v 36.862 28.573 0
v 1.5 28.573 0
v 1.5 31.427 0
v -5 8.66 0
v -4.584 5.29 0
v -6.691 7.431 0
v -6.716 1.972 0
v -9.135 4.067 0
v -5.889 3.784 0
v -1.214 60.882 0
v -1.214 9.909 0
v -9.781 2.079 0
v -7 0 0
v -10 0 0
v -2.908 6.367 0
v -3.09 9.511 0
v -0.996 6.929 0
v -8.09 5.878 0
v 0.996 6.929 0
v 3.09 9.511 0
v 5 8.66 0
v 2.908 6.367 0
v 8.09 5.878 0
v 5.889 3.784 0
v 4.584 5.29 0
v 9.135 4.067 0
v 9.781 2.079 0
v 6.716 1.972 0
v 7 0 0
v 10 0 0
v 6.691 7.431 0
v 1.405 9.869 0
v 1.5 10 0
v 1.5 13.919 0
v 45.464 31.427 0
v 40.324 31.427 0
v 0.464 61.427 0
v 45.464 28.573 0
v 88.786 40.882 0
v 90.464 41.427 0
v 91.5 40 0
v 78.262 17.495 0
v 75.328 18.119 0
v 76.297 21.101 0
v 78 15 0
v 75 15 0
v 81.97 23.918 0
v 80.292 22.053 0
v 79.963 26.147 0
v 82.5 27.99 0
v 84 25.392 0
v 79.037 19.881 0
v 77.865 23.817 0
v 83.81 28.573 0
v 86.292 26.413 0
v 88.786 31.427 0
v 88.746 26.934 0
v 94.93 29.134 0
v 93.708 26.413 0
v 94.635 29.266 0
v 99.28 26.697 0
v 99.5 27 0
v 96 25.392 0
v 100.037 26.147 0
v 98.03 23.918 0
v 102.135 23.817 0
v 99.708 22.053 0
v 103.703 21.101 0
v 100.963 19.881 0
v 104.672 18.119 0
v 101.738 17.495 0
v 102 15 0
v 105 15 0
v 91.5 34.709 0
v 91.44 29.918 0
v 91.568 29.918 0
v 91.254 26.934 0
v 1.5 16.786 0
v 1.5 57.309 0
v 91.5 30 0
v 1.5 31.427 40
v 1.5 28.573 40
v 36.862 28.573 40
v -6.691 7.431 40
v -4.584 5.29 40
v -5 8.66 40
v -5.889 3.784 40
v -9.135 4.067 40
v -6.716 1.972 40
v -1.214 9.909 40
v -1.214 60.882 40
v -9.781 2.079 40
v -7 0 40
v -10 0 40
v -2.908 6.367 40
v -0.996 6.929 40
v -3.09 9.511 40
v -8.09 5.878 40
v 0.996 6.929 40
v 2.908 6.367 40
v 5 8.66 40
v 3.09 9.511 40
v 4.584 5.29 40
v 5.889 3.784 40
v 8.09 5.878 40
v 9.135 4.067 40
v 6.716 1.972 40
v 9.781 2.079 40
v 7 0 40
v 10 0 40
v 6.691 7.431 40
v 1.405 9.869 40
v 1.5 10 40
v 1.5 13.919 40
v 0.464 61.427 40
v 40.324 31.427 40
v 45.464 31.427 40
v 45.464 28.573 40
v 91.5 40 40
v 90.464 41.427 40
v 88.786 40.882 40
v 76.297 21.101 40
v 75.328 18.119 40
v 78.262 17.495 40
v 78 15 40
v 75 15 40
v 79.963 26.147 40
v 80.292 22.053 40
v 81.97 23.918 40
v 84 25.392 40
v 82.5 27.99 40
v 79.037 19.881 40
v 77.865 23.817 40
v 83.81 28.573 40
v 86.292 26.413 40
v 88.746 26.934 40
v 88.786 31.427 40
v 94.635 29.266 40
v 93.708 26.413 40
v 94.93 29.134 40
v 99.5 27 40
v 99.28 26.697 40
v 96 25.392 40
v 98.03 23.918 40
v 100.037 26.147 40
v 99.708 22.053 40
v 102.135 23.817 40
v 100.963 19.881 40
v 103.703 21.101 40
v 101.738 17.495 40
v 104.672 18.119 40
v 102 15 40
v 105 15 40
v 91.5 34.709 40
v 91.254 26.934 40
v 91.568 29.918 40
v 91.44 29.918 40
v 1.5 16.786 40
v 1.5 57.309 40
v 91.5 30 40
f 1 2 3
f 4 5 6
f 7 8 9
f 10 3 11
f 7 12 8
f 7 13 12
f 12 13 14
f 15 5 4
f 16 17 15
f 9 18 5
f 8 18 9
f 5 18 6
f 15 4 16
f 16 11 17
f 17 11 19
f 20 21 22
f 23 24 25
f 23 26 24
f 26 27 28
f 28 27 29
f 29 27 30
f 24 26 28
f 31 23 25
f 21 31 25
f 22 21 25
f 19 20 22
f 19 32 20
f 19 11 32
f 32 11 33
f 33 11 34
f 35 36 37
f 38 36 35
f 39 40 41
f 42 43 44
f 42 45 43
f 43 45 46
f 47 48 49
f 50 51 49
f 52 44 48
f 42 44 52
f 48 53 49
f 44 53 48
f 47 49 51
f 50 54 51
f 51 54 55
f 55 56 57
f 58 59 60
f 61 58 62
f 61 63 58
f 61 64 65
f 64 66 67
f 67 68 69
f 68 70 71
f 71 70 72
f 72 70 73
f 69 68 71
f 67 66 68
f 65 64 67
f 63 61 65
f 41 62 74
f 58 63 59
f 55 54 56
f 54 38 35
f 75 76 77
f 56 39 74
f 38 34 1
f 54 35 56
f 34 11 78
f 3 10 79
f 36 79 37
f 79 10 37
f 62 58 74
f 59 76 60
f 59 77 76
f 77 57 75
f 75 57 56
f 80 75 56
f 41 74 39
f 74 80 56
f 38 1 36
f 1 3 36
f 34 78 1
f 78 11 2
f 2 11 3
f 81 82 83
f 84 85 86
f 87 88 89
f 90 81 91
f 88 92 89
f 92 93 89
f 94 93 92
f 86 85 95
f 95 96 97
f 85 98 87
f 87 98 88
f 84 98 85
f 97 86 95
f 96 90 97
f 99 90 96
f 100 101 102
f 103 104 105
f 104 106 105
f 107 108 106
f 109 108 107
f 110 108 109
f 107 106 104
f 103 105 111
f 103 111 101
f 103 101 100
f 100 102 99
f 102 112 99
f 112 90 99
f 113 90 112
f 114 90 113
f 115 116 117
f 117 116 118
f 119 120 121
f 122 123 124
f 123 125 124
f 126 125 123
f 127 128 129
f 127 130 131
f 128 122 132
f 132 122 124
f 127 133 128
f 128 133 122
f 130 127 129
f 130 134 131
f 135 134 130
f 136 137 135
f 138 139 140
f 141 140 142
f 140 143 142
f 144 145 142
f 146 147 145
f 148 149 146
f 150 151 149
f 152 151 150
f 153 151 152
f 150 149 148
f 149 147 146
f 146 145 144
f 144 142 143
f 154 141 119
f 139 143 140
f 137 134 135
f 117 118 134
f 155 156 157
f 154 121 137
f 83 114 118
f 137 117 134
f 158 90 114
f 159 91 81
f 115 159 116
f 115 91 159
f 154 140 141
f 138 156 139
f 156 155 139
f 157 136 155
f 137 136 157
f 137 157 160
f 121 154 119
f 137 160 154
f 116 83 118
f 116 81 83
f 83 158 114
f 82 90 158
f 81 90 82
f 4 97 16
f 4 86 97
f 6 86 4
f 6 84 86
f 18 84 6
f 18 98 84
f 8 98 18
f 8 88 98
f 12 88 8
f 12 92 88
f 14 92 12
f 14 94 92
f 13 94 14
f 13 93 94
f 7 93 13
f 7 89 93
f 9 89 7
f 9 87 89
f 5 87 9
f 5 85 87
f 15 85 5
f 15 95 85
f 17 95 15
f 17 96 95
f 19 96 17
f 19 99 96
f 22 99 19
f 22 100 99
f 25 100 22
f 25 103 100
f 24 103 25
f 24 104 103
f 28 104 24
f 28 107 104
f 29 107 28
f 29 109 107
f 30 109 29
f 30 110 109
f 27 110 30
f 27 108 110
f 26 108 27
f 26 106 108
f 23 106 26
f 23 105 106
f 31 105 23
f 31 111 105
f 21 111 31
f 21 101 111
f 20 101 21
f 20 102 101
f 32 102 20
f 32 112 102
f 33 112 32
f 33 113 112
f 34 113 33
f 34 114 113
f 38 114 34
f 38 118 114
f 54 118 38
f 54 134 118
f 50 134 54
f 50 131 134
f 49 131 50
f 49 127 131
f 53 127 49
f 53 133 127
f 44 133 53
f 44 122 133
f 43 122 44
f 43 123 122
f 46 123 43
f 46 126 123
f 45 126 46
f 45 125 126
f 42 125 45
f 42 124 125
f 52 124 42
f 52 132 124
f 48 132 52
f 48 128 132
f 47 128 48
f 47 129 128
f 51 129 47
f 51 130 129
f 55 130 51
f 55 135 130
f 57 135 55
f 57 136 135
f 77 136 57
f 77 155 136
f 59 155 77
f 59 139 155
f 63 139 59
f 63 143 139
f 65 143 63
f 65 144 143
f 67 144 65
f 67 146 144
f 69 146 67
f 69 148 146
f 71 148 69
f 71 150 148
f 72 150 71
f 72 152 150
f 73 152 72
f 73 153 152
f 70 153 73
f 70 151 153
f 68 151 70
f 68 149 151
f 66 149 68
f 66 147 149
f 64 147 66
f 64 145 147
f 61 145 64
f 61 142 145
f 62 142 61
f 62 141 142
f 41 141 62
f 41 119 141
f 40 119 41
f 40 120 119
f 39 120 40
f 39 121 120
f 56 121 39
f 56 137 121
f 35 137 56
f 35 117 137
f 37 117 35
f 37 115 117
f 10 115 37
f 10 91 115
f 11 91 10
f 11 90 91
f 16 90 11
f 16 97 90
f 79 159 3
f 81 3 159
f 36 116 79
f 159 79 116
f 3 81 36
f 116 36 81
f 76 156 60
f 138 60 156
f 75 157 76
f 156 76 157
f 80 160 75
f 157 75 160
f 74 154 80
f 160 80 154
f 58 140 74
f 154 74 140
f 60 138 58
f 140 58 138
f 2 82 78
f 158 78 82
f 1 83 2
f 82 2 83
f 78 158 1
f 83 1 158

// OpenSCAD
// file: support/arc.scad
module arc(inner_r, wall, angle, align="inside") {
  abs_angle = abs(angle) % 360;
  dia = inner_r*2;

  // 360 degrees is 2𝜋 radians
  // x=5 cos 𝜃
  // y=5 sin 𝜃

  points = [
    [0, 0],
    for (i=[360:-90:abs_angle]) [(dia * cos(i)), dia * sin(i)],
    [dia * cos(abs_angle), dia * sin(abs_angle)]
  ];

  offset = align == "inside"
    ? 0
    : align == "outside"
    ? wall
    : align == "middle"
    ? wall/2
    : 0;

  difference() {
    circle(r=inner_r + wall - offset);

    circle(r=inner_r - offset);

    rotate([0, 0, abs_angle > angle ? angle : 0]) {
      polygon(points);
    }
  }
}
// file: support/linepath.scad
module line(start, end, thickness = 1) {
  hull() {
    translate(start) circle(thickness);
    translate(end) circle(thickness);
  }
}

module path(line_points, thickness = 1) {
  for (i=[0:len(line_points)-1]) {
    if (i > 0) {
      line(line_points[i-1], line_points[i], thickness);
    }
  }
}

// line([40, 10, 0], [70, 70, 0])
// path([40, 10, 0], [70, 70, 0], [100, 100, 0])
// path can take multiple arguments- including the return of PolyRound (Only supports 2d lines)
// main file
include <support/linepath.scad>
include <support/arc.scad>

phone_width = 20;
wall = 3;

small_r = 20/2;
big_r = 30/2;

h_offset = 15;
height = h_offset + big_r;
width = 90;


linear_extrude(40) {
  arc(small_r, wall, 180, align="outside");

  translate([width, h_offset, 0])
  arc(big_r, wall, 180, align="outside");

  path([
    [0, small_r, 0],
    [0, height, 0],
    [width, height, 0],
  ], wall/2);

//   Bottom Brace
  line([0, height/2, 0], [width/2, height, 0], wall/2);

//   Step
  line([width, height, 0], [width, height + 10, 0], wall/2);
  line([width, height + 10, 0], [width + 8, height - 3, 0], wall/2);

  line([0, height, 0], [0, height + 30, 0], wall/2);
  line([0, height + 30, 0], [width/2, height, 0], wall/2);
}
